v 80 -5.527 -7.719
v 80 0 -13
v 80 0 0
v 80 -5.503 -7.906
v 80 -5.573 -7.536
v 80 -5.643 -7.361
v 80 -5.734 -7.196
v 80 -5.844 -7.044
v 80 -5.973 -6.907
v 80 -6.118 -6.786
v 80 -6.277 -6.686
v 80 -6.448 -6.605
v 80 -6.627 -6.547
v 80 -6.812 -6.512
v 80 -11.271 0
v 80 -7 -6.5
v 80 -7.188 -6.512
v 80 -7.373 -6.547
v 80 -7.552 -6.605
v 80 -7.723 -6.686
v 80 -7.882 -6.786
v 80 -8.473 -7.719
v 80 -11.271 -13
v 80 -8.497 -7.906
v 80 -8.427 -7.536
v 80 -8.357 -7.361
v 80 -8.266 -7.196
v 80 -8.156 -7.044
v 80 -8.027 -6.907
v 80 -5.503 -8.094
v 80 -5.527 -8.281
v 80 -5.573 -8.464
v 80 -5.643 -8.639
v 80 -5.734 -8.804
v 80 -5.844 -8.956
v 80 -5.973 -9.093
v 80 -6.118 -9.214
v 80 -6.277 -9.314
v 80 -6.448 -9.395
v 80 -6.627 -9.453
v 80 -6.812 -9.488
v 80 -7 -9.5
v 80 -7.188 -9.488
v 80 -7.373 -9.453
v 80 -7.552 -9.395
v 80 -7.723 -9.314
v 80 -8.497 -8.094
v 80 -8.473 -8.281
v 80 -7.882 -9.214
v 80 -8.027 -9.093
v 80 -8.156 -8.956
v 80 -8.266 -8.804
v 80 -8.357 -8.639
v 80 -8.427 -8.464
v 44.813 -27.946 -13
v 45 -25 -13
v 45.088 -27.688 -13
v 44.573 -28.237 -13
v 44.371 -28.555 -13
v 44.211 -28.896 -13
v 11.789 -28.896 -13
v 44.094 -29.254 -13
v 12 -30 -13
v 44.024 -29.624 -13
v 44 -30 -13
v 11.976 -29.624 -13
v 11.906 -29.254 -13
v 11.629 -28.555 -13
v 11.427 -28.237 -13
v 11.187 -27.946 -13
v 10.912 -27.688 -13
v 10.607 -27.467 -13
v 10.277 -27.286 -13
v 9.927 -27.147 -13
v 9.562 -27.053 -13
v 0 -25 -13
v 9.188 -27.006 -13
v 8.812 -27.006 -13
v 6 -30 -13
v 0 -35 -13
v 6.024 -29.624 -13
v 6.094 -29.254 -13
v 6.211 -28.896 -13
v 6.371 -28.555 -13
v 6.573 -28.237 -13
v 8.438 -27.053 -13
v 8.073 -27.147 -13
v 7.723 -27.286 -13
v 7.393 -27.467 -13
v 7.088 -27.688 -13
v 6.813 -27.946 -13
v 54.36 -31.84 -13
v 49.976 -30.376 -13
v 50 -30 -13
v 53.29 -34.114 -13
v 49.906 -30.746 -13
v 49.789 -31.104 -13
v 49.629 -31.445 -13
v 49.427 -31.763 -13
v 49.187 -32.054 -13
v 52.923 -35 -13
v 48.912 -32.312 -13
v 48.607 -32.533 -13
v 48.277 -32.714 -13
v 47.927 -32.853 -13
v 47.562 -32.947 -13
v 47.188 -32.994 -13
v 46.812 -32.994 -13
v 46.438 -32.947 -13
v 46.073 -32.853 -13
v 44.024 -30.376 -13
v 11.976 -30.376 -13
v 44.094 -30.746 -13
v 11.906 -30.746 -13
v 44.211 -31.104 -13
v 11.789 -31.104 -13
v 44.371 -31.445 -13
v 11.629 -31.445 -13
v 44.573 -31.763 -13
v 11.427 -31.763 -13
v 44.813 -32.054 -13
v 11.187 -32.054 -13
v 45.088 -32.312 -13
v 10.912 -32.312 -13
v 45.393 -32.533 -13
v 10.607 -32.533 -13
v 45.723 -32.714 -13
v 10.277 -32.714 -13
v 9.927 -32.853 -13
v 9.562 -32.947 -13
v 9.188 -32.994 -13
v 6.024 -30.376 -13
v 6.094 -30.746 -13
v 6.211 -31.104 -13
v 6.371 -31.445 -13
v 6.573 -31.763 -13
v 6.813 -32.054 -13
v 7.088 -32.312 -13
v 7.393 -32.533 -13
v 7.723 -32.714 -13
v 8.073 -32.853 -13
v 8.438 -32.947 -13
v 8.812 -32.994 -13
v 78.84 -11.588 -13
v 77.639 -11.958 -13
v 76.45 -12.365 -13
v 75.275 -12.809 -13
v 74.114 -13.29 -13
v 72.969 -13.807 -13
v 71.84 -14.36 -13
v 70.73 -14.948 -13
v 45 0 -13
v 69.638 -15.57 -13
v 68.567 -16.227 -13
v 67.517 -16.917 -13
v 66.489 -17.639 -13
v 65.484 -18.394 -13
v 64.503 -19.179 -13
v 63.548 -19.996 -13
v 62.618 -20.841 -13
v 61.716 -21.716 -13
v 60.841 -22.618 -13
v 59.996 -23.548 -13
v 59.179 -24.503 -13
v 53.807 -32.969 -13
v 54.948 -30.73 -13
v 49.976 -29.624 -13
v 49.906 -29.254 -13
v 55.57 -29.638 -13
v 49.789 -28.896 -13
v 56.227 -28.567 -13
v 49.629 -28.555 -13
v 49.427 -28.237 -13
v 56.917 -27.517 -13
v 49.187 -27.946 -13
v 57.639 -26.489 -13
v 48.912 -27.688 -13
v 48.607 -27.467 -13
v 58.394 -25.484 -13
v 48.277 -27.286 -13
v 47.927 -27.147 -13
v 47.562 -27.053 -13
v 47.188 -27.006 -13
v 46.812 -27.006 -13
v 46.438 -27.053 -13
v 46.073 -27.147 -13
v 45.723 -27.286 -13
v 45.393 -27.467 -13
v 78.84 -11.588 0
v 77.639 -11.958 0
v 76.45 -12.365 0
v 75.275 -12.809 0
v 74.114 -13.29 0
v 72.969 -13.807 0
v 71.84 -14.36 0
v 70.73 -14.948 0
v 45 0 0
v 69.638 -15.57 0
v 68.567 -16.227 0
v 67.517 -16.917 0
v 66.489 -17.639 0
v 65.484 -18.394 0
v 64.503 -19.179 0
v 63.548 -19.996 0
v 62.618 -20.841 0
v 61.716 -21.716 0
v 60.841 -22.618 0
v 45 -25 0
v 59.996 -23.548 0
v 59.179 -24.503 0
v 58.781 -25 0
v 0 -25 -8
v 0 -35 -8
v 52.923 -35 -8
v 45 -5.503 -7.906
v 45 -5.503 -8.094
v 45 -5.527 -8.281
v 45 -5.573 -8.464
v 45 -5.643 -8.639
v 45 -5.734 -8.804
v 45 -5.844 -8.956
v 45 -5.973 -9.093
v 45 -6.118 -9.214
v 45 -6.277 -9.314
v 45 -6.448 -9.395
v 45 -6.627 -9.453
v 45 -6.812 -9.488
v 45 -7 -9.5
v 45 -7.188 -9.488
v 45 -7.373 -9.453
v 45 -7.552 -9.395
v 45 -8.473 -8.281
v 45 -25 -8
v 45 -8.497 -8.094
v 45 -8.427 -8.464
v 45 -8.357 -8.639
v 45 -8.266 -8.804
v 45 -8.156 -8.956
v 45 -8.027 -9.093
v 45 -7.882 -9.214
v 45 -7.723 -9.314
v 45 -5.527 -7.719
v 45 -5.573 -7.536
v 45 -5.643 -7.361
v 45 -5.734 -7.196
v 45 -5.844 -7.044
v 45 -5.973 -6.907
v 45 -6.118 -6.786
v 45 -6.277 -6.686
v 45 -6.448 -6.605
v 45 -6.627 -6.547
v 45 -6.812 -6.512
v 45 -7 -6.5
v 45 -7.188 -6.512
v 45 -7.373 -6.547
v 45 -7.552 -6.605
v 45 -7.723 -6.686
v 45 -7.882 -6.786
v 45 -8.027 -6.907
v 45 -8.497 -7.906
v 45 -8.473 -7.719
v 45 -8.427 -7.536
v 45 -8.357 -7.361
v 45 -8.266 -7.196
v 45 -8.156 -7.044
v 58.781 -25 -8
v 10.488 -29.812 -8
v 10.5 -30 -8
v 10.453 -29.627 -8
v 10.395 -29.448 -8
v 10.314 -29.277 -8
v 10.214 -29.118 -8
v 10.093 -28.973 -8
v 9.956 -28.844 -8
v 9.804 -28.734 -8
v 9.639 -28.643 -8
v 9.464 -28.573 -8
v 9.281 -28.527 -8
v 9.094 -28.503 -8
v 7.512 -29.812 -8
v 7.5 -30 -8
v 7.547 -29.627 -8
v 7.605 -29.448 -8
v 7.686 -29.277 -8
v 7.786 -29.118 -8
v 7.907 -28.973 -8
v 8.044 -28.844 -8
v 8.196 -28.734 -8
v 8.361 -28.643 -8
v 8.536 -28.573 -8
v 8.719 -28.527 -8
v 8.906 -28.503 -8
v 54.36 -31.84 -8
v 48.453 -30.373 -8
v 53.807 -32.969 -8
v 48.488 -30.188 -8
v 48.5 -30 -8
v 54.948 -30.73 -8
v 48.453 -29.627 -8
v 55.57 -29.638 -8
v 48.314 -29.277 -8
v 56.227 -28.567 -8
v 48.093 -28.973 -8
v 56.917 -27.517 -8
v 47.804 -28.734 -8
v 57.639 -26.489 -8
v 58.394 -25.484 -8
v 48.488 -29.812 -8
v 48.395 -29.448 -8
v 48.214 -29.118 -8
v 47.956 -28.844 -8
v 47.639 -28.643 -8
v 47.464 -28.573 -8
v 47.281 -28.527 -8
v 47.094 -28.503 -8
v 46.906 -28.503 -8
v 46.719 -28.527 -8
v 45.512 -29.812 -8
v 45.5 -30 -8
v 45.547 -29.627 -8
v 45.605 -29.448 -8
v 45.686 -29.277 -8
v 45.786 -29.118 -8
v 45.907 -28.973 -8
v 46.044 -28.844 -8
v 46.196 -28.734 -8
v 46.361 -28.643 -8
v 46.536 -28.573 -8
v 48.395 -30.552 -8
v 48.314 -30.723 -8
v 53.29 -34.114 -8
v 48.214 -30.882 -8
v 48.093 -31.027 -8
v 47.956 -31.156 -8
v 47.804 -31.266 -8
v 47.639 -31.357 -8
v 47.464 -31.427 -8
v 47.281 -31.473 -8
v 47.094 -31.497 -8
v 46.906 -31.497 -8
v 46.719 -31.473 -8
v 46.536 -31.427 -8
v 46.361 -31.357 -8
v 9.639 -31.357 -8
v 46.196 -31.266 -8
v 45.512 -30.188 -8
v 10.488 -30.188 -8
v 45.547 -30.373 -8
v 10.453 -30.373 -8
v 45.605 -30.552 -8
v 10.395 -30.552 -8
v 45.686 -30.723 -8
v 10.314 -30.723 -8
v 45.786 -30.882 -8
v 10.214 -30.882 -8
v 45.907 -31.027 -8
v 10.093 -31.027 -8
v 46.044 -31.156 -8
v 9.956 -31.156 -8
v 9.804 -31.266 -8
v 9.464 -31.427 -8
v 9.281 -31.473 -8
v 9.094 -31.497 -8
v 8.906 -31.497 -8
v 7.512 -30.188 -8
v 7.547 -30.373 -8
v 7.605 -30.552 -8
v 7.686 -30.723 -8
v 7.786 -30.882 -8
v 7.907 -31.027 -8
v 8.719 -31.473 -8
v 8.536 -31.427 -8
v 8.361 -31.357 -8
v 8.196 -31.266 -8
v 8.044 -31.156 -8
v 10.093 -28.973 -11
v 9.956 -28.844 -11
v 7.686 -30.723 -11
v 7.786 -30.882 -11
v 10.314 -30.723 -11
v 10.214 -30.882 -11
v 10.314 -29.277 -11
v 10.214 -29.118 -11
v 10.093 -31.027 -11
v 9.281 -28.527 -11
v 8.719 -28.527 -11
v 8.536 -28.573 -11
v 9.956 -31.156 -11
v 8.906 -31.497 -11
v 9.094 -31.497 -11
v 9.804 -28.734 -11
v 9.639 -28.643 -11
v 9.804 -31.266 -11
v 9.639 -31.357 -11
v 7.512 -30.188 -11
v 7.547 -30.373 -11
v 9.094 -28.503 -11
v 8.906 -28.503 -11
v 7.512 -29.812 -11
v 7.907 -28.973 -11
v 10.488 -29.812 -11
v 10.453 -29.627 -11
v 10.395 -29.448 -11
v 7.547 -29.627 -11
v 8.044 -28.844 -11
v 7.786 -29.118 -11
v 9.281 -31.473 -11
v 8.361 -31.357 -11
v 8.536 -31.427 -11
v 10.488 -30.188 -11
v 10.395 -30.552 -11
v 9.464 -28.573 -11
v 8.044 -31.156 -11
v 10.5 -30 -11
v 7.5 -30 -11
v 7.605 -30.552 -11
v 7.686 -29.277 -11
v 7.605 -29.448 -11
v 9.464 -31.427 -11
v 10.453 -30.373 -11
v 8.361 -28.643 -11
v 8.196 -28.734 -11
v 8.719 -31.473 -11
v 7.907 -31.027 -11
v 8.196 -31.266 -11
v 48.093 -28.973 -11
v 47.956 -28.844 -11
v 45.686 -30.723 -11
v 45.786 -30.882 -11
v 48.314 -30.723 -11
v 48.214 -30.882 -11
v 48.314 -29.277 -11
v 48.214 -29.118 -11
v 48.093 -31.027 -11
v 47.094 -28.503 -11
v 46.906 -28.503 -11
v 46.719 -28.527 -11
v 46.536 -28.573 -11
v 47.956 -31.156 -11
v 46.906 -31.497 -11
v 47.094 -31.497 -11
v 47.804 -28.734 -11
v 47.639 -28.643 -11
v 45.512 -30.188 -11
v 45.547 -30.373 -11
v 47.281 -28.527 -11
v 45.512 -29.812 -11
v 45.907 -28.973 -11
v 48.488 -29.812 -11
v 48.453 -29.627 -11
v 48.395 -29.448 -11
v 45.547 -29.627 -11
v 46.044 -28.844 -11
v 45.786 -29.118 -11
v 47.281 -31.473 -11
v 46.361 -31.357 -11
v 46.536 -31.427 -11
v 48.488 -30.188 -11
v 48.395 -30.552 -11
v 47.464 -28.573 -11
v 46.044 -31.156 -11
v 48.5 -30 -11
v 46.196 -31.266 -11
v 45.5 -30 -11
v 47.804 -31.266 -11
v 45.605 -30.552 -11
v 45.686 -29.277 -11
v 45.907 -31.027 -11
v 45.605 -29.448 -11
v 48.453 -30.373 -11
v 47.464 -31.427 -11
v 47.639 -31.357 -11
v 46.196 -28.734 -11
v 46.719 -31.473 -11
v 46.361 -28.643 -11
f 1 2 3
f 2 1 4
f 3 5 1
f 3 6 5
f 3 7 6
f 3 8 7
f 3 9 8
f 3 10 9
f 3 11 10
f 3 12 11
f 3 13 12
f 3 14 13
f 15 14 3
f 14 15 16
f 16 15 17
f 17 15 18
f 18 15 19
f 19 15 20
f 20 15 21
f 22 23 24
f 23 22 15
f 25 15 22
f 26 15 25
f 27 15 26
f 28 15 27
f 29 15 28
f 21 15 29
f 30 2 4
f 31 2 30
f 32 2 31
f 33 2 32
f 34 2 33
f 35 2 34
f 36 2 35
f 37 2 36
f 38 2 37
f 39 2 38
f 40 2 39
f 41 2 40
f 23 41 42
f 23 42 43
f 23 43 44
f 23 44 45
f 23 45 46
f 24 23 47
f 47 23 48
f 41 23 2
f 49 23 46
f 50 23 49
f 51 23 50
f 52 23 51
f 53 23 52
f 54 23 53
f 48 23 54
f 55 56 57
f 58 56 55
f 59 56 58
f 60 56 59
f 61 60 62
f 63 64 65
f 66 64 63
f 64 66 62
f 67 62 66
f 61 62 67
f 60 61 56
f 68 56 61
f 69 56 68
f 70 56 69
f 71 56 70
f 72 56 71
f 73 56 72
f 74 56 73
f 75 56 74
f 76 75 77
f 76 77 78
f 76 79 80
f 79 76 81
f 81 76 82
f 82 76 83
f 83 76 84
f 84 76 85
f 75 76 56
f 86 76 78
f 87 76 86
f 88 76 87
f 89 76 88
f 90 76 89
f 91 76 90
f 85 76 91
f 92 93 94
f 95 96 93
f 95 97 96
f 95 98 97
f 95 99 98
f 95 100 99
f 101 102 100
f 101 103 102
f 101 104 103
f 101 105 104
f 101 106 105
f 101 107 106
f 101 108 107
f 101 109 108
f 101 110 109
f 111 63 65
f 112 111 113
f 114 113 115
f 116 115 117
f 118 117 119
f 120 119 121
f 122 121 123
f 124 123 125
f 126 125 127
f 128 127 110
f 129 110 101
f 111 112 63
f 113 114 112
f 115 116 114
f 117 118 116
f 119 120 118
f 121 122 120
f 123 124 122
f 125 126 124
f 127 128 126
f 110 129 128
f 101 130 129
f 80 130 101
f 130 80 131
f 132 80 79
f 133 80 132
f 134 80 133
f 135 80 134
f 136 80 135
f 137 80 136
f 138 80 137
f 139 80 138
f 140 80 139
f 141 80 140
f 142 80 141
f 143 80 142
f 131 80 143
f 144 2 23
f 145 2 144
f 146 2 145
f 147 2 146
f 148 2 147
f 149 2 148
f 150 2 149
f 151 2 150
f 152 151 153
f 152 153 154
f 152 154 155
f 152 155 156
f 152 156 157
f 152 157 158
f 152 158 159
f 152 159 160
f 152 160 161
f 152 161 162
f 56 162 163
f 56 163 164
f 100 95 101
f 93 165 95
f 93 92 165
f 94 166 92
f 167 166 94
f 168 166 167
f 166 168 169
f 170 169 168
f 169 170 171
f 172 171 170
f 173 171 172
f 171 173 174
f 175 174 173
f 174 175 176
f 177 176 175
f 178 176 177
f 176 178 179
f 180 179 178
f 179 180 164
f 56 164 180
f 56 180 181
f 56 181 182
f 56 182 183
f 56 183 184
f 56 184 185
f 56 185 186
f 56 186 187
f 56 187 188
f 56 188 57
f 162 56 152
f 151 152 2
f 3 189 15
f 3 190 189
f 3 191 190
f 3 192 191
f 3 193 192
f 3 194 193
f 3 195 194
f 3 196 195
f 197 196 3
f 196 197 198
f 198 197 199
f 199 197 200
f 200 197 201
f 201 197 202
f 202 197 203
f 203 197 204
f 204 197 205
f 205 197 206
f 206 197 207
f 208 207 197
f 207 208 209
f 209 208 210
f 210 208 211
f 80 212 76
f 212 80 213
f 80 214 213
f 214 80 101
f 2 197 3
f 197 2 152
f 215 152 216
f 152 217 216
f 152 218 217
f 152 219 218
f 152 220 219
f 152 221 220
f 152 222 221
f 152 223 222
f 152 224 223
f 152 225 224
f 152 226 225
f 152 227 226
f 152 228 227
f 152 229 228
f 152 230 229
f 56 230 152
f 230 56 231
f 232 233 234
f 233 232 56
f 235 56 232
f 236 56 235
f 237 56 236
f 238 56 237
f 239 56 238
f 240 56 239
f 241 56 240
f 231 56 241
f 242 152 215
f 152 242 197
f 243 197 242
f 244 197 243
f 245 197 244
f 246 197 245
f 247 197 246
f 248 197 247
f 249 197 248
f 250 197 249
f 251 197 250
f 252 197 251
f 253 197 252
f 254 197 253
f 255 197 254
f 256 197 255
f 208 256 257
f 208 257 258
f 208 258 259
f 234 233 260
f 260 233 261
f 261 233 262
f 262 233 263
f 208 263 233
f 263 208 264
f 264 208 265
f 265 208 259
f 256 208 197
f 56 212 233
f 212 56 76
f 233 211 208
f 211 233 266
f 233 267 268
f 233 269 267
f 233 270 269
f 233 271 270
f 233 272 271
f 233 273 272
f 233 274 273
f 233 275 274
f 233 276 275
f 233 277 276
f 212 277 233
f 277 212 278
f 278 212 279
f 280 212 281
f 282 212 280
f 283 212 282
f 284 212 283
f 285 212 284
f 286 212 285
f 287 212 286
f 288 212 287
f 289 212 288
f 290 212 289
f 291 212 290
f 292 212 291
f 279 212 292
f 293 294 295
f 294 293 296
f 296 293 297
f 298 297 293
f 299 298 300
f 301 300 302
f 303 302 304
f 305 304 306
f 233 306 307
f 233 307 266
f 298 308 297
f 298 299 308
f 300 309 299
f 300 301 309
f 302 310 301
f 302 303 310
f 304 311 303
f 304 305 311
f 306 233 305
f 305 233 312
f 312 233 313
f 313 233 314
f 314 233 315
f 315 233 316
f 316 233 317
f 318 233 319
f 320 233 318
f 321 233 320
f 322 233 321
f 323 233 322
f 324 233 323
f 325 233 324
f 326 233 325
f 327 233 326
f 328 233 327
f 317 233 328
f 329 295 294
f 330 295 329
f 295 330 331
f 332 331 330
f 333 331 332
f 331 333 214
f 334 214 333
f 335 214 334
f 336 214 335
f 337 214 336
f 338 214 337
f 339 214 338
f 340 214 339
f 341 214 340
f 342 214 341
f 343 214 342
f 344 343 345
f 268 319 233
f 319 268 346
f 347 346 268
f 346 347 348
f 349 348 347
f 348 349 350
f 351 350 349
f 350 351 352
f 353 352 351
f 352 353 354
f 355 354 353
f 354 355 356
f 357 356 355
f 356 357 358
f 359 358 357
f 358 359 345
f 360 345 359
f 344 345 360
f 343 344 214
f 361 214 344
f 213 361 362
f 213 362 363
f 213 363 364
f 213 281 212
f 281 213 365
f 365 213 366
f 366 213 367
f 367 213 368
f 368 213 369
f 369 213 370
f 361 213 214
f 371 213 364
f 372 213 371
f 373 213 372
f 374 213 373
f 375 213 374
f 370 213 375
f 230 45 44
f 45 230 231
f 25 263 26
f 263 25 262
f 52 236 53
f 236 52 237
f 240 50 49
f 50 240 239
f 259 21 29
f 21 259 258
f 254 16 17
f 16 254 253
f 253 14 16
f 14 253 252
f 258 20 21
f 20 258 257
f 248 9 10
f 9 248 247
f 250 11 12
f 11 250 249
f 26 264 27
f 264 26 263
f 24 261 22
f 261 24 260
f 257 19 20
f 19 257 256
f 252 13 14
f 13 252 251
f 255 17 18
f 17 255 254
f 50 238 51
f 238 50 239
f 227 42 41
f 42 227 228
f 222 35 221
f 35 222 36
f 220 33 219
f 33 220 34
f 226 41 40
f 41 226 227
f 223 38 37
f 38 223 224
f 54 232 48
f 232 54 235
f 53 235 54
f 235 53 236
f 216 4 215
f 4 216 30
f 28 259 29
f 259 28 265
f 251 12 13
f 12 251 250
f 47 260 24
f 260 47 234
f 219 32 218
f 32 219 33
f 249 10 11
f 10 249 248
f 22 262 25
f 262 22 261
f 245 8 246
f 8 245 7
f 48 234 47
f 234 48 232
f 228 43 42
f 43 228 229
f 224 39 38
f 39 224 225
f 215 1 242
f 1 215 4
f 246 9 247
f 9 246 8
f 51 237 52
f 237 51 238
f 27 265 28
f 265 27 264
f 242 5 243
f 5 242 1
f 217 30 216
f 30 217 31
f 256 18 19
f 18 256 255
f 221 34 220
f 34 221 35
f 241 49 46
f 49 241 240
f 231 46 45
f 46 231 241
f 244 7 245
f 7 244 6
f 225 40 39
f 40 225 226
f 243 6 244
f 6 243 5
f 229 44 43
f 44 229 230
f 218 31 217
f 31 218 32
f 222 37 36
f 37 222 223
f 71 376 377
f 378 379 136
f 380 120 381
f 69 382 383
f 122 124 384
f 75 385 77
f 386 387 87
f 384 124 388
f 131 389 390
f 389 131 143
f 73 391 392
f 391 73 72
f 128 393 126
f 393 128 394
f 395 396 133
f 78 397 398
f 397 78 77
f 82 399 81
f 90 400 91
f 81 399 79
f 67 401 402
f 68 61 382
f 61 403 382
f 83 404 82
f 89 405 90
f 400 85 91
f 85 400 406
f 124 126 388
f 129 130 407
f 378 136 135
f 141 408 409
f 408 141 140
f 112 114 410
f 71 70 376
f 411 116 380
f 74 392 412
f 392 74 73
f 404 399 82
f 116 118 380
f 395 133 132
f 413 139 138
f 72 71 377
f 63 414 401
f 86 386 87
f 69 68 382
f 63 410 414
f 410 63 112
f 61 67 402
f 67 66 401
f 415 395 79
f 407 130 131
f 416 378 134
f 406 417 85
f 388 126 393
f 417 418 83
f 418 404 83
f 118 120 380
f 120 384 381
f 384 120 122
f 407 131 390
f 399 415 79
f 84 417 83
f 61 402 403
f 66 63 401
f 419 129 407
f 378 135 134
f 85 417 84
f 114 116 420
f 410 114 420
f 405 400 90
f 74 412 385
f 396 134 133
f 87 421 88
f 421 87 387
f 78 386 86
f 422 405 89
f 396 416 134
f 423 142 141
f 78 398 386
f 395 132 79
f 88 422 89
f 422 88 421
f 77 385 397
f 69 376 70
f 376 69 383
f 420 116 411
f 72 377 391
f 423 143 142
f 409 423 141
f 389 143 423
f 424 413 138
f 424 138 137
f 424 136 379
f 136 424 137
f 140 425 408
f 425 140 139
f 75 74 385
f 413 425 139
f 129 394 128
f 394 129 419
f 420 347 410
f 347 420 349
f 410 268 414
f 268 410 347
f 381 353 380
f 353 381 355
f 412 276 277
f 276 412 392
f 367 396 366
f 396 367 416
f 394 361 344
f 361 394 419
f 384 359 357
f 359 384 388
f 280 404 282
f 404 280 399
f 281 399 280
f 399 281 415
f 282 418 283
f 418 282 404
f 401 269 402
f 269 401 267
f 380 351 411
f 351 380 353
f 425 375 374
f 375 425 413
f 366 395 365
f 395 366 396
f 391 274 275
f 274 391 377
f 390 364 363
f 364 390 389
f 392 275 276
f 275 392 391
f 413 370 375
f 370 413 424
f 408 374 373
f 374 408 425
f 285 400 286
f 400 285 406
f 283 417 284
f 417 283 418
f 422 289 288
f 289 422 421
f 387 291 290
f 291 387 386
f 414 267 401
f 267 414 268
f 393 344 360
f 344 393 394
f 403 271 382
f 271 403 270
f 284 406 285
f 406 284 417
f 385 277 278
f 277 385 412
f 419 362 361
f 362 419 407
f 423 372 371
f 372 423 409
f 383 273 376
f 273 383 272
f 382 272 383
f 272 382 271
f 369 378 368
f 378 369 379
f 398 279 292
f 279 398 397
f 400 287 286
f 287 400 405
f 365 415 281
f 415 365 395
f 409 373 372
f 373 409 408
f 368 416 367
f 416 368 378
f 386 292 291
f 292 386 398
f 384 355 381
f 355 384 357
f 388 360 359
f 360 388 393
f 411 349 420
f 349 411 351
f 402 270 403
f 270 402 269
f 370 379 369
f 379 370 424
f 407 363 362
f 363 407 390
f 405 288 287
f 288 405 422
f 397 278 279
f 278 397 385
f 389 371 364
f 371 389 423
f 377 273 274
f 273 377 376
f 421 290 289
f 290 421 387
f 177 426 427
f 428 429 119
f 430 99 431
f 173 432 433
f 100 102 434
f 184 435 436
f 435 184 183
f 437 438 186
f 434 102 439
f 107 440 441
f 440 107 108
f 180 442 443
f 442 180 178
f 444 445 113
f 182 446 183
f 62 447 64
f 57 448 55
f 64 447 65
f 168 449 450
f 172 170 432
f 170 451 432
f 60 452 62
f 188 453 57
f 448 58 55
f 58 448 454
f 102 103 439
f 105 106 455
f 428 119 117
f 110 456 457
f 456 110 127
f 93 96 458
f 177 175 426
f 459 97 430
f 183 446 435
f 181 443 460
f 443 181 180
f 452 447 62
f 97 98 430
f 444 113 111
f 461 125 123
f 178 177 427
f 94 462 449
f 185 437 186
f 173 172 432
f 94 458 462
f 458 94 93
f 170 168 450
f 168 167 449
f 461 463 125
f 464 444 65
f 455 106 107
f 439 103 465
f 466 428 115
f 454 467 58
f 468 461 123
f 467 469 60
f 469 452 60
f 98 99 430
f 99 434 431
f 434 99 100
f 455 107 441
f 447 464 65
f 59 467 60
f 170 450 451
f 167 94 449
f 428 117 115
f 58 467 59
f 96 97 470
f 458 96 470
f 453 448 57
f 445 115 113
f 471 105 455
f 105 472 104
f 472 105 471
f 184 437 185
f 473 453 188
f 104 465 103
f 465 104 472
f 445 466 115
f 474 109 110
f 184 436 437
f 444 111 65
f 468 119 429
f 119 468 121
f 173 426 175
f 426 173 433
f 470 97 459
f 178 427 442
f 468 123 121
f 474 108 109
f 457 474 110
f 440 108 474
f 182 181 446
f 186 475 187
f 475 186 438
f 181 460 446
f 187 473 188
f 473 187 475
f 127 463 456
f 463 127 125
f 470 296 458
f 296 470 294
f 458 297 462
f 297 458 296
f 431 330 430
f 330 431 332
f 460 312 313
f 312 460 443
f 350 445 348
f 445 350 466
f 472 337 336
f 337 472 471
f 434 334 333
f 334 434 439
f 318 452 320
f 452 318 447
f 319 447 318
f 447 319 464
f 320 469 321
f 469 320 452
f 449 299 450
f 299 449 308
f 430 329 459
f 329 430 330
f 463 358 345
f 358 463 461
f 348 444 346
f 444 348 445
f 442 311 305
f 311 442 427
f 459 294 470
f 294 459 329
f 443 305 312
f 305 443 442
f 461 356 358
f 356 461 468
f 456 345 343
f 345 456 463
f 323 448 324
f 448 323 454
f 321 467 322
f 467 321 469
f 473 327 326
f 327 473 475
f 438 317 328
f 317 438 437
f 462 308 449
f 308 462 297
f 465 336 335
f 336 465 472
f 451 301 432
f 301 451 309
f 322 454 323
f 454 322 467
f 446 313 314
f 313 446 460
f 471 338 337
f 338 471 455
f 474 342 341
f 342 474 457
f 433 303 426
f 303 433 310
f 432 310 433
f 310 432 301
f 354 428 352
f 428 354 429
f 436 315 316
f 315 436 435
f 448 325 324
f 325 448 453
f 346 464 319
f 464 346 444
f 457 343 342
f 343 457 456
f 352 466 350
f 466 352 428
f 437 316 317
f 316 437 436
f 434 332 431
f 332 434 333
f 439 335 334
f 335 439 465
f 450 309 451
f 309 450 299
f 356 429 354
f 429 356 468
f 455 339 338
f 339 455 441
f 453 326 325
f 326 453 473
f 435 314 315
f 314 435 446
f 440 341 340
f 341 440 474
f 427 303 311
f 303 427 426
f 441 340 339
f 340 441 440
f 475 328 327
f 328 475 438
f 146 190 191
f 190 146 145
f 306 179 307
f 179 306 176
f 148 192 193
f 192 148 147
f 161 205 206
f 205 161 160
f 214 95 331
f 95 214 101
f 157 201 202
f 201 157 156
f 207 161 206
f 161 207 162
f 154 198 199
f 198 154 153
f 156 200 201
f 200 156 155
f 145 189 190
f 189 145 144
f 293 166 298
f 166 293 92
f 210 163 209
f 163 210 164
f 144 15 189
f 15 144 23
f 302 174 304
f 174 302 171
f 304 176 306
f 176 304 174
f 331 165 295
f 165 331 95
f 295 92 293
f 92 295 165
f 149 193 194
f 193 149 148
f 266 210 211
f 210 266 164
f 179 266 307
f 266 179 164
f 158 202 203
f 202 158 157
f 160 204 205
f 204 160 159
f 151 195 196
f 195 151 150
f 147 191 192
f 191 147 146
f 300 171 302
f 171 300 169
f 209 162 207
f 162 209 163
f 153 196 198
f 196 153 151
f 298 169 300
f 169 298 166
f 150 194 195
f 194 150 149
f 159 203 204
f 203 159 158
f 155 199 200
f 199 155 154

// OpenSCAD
r_m3=1.5;
r_tete_m3=3;

module endstop_x(){
	difference(){
		cube([80,35,13]);

		//extrusion générale
		translate([-5,-5,-5]){cube([50,30,25]);}
		translate([-5,25,-5]){cube([100,30,13]);}

		//trous pour vis de réglage
		translate([40,7,8]){rotate([0,90,0])cylinder(h = 50, r=r_m3, $fn=50);}


	//trous de vissage
		translate([9,30,11]){cylinder(h = 2, r1 = r_m3, r2=r_tete_m3, $fn=50);}
		translate([9,30,-5]){cylinder(h = 30, r = r_m3, $fn=50);}

		translate([47,30,11]){cylinder(h = 2, r1 = r_m3, r2=r_tete_m3, $fn=50);}
		translate([47,30,-5]){cylinder(h = 30, r = r_m3, $fn=50);}

		//extrusion pour alléger la pièce
		translate([90,50,-5]){cylinder(h = 50, r=40, $fn=200);}
		

	}
}

rotate([180,0,0])endstop_x();

//endstop_x();
